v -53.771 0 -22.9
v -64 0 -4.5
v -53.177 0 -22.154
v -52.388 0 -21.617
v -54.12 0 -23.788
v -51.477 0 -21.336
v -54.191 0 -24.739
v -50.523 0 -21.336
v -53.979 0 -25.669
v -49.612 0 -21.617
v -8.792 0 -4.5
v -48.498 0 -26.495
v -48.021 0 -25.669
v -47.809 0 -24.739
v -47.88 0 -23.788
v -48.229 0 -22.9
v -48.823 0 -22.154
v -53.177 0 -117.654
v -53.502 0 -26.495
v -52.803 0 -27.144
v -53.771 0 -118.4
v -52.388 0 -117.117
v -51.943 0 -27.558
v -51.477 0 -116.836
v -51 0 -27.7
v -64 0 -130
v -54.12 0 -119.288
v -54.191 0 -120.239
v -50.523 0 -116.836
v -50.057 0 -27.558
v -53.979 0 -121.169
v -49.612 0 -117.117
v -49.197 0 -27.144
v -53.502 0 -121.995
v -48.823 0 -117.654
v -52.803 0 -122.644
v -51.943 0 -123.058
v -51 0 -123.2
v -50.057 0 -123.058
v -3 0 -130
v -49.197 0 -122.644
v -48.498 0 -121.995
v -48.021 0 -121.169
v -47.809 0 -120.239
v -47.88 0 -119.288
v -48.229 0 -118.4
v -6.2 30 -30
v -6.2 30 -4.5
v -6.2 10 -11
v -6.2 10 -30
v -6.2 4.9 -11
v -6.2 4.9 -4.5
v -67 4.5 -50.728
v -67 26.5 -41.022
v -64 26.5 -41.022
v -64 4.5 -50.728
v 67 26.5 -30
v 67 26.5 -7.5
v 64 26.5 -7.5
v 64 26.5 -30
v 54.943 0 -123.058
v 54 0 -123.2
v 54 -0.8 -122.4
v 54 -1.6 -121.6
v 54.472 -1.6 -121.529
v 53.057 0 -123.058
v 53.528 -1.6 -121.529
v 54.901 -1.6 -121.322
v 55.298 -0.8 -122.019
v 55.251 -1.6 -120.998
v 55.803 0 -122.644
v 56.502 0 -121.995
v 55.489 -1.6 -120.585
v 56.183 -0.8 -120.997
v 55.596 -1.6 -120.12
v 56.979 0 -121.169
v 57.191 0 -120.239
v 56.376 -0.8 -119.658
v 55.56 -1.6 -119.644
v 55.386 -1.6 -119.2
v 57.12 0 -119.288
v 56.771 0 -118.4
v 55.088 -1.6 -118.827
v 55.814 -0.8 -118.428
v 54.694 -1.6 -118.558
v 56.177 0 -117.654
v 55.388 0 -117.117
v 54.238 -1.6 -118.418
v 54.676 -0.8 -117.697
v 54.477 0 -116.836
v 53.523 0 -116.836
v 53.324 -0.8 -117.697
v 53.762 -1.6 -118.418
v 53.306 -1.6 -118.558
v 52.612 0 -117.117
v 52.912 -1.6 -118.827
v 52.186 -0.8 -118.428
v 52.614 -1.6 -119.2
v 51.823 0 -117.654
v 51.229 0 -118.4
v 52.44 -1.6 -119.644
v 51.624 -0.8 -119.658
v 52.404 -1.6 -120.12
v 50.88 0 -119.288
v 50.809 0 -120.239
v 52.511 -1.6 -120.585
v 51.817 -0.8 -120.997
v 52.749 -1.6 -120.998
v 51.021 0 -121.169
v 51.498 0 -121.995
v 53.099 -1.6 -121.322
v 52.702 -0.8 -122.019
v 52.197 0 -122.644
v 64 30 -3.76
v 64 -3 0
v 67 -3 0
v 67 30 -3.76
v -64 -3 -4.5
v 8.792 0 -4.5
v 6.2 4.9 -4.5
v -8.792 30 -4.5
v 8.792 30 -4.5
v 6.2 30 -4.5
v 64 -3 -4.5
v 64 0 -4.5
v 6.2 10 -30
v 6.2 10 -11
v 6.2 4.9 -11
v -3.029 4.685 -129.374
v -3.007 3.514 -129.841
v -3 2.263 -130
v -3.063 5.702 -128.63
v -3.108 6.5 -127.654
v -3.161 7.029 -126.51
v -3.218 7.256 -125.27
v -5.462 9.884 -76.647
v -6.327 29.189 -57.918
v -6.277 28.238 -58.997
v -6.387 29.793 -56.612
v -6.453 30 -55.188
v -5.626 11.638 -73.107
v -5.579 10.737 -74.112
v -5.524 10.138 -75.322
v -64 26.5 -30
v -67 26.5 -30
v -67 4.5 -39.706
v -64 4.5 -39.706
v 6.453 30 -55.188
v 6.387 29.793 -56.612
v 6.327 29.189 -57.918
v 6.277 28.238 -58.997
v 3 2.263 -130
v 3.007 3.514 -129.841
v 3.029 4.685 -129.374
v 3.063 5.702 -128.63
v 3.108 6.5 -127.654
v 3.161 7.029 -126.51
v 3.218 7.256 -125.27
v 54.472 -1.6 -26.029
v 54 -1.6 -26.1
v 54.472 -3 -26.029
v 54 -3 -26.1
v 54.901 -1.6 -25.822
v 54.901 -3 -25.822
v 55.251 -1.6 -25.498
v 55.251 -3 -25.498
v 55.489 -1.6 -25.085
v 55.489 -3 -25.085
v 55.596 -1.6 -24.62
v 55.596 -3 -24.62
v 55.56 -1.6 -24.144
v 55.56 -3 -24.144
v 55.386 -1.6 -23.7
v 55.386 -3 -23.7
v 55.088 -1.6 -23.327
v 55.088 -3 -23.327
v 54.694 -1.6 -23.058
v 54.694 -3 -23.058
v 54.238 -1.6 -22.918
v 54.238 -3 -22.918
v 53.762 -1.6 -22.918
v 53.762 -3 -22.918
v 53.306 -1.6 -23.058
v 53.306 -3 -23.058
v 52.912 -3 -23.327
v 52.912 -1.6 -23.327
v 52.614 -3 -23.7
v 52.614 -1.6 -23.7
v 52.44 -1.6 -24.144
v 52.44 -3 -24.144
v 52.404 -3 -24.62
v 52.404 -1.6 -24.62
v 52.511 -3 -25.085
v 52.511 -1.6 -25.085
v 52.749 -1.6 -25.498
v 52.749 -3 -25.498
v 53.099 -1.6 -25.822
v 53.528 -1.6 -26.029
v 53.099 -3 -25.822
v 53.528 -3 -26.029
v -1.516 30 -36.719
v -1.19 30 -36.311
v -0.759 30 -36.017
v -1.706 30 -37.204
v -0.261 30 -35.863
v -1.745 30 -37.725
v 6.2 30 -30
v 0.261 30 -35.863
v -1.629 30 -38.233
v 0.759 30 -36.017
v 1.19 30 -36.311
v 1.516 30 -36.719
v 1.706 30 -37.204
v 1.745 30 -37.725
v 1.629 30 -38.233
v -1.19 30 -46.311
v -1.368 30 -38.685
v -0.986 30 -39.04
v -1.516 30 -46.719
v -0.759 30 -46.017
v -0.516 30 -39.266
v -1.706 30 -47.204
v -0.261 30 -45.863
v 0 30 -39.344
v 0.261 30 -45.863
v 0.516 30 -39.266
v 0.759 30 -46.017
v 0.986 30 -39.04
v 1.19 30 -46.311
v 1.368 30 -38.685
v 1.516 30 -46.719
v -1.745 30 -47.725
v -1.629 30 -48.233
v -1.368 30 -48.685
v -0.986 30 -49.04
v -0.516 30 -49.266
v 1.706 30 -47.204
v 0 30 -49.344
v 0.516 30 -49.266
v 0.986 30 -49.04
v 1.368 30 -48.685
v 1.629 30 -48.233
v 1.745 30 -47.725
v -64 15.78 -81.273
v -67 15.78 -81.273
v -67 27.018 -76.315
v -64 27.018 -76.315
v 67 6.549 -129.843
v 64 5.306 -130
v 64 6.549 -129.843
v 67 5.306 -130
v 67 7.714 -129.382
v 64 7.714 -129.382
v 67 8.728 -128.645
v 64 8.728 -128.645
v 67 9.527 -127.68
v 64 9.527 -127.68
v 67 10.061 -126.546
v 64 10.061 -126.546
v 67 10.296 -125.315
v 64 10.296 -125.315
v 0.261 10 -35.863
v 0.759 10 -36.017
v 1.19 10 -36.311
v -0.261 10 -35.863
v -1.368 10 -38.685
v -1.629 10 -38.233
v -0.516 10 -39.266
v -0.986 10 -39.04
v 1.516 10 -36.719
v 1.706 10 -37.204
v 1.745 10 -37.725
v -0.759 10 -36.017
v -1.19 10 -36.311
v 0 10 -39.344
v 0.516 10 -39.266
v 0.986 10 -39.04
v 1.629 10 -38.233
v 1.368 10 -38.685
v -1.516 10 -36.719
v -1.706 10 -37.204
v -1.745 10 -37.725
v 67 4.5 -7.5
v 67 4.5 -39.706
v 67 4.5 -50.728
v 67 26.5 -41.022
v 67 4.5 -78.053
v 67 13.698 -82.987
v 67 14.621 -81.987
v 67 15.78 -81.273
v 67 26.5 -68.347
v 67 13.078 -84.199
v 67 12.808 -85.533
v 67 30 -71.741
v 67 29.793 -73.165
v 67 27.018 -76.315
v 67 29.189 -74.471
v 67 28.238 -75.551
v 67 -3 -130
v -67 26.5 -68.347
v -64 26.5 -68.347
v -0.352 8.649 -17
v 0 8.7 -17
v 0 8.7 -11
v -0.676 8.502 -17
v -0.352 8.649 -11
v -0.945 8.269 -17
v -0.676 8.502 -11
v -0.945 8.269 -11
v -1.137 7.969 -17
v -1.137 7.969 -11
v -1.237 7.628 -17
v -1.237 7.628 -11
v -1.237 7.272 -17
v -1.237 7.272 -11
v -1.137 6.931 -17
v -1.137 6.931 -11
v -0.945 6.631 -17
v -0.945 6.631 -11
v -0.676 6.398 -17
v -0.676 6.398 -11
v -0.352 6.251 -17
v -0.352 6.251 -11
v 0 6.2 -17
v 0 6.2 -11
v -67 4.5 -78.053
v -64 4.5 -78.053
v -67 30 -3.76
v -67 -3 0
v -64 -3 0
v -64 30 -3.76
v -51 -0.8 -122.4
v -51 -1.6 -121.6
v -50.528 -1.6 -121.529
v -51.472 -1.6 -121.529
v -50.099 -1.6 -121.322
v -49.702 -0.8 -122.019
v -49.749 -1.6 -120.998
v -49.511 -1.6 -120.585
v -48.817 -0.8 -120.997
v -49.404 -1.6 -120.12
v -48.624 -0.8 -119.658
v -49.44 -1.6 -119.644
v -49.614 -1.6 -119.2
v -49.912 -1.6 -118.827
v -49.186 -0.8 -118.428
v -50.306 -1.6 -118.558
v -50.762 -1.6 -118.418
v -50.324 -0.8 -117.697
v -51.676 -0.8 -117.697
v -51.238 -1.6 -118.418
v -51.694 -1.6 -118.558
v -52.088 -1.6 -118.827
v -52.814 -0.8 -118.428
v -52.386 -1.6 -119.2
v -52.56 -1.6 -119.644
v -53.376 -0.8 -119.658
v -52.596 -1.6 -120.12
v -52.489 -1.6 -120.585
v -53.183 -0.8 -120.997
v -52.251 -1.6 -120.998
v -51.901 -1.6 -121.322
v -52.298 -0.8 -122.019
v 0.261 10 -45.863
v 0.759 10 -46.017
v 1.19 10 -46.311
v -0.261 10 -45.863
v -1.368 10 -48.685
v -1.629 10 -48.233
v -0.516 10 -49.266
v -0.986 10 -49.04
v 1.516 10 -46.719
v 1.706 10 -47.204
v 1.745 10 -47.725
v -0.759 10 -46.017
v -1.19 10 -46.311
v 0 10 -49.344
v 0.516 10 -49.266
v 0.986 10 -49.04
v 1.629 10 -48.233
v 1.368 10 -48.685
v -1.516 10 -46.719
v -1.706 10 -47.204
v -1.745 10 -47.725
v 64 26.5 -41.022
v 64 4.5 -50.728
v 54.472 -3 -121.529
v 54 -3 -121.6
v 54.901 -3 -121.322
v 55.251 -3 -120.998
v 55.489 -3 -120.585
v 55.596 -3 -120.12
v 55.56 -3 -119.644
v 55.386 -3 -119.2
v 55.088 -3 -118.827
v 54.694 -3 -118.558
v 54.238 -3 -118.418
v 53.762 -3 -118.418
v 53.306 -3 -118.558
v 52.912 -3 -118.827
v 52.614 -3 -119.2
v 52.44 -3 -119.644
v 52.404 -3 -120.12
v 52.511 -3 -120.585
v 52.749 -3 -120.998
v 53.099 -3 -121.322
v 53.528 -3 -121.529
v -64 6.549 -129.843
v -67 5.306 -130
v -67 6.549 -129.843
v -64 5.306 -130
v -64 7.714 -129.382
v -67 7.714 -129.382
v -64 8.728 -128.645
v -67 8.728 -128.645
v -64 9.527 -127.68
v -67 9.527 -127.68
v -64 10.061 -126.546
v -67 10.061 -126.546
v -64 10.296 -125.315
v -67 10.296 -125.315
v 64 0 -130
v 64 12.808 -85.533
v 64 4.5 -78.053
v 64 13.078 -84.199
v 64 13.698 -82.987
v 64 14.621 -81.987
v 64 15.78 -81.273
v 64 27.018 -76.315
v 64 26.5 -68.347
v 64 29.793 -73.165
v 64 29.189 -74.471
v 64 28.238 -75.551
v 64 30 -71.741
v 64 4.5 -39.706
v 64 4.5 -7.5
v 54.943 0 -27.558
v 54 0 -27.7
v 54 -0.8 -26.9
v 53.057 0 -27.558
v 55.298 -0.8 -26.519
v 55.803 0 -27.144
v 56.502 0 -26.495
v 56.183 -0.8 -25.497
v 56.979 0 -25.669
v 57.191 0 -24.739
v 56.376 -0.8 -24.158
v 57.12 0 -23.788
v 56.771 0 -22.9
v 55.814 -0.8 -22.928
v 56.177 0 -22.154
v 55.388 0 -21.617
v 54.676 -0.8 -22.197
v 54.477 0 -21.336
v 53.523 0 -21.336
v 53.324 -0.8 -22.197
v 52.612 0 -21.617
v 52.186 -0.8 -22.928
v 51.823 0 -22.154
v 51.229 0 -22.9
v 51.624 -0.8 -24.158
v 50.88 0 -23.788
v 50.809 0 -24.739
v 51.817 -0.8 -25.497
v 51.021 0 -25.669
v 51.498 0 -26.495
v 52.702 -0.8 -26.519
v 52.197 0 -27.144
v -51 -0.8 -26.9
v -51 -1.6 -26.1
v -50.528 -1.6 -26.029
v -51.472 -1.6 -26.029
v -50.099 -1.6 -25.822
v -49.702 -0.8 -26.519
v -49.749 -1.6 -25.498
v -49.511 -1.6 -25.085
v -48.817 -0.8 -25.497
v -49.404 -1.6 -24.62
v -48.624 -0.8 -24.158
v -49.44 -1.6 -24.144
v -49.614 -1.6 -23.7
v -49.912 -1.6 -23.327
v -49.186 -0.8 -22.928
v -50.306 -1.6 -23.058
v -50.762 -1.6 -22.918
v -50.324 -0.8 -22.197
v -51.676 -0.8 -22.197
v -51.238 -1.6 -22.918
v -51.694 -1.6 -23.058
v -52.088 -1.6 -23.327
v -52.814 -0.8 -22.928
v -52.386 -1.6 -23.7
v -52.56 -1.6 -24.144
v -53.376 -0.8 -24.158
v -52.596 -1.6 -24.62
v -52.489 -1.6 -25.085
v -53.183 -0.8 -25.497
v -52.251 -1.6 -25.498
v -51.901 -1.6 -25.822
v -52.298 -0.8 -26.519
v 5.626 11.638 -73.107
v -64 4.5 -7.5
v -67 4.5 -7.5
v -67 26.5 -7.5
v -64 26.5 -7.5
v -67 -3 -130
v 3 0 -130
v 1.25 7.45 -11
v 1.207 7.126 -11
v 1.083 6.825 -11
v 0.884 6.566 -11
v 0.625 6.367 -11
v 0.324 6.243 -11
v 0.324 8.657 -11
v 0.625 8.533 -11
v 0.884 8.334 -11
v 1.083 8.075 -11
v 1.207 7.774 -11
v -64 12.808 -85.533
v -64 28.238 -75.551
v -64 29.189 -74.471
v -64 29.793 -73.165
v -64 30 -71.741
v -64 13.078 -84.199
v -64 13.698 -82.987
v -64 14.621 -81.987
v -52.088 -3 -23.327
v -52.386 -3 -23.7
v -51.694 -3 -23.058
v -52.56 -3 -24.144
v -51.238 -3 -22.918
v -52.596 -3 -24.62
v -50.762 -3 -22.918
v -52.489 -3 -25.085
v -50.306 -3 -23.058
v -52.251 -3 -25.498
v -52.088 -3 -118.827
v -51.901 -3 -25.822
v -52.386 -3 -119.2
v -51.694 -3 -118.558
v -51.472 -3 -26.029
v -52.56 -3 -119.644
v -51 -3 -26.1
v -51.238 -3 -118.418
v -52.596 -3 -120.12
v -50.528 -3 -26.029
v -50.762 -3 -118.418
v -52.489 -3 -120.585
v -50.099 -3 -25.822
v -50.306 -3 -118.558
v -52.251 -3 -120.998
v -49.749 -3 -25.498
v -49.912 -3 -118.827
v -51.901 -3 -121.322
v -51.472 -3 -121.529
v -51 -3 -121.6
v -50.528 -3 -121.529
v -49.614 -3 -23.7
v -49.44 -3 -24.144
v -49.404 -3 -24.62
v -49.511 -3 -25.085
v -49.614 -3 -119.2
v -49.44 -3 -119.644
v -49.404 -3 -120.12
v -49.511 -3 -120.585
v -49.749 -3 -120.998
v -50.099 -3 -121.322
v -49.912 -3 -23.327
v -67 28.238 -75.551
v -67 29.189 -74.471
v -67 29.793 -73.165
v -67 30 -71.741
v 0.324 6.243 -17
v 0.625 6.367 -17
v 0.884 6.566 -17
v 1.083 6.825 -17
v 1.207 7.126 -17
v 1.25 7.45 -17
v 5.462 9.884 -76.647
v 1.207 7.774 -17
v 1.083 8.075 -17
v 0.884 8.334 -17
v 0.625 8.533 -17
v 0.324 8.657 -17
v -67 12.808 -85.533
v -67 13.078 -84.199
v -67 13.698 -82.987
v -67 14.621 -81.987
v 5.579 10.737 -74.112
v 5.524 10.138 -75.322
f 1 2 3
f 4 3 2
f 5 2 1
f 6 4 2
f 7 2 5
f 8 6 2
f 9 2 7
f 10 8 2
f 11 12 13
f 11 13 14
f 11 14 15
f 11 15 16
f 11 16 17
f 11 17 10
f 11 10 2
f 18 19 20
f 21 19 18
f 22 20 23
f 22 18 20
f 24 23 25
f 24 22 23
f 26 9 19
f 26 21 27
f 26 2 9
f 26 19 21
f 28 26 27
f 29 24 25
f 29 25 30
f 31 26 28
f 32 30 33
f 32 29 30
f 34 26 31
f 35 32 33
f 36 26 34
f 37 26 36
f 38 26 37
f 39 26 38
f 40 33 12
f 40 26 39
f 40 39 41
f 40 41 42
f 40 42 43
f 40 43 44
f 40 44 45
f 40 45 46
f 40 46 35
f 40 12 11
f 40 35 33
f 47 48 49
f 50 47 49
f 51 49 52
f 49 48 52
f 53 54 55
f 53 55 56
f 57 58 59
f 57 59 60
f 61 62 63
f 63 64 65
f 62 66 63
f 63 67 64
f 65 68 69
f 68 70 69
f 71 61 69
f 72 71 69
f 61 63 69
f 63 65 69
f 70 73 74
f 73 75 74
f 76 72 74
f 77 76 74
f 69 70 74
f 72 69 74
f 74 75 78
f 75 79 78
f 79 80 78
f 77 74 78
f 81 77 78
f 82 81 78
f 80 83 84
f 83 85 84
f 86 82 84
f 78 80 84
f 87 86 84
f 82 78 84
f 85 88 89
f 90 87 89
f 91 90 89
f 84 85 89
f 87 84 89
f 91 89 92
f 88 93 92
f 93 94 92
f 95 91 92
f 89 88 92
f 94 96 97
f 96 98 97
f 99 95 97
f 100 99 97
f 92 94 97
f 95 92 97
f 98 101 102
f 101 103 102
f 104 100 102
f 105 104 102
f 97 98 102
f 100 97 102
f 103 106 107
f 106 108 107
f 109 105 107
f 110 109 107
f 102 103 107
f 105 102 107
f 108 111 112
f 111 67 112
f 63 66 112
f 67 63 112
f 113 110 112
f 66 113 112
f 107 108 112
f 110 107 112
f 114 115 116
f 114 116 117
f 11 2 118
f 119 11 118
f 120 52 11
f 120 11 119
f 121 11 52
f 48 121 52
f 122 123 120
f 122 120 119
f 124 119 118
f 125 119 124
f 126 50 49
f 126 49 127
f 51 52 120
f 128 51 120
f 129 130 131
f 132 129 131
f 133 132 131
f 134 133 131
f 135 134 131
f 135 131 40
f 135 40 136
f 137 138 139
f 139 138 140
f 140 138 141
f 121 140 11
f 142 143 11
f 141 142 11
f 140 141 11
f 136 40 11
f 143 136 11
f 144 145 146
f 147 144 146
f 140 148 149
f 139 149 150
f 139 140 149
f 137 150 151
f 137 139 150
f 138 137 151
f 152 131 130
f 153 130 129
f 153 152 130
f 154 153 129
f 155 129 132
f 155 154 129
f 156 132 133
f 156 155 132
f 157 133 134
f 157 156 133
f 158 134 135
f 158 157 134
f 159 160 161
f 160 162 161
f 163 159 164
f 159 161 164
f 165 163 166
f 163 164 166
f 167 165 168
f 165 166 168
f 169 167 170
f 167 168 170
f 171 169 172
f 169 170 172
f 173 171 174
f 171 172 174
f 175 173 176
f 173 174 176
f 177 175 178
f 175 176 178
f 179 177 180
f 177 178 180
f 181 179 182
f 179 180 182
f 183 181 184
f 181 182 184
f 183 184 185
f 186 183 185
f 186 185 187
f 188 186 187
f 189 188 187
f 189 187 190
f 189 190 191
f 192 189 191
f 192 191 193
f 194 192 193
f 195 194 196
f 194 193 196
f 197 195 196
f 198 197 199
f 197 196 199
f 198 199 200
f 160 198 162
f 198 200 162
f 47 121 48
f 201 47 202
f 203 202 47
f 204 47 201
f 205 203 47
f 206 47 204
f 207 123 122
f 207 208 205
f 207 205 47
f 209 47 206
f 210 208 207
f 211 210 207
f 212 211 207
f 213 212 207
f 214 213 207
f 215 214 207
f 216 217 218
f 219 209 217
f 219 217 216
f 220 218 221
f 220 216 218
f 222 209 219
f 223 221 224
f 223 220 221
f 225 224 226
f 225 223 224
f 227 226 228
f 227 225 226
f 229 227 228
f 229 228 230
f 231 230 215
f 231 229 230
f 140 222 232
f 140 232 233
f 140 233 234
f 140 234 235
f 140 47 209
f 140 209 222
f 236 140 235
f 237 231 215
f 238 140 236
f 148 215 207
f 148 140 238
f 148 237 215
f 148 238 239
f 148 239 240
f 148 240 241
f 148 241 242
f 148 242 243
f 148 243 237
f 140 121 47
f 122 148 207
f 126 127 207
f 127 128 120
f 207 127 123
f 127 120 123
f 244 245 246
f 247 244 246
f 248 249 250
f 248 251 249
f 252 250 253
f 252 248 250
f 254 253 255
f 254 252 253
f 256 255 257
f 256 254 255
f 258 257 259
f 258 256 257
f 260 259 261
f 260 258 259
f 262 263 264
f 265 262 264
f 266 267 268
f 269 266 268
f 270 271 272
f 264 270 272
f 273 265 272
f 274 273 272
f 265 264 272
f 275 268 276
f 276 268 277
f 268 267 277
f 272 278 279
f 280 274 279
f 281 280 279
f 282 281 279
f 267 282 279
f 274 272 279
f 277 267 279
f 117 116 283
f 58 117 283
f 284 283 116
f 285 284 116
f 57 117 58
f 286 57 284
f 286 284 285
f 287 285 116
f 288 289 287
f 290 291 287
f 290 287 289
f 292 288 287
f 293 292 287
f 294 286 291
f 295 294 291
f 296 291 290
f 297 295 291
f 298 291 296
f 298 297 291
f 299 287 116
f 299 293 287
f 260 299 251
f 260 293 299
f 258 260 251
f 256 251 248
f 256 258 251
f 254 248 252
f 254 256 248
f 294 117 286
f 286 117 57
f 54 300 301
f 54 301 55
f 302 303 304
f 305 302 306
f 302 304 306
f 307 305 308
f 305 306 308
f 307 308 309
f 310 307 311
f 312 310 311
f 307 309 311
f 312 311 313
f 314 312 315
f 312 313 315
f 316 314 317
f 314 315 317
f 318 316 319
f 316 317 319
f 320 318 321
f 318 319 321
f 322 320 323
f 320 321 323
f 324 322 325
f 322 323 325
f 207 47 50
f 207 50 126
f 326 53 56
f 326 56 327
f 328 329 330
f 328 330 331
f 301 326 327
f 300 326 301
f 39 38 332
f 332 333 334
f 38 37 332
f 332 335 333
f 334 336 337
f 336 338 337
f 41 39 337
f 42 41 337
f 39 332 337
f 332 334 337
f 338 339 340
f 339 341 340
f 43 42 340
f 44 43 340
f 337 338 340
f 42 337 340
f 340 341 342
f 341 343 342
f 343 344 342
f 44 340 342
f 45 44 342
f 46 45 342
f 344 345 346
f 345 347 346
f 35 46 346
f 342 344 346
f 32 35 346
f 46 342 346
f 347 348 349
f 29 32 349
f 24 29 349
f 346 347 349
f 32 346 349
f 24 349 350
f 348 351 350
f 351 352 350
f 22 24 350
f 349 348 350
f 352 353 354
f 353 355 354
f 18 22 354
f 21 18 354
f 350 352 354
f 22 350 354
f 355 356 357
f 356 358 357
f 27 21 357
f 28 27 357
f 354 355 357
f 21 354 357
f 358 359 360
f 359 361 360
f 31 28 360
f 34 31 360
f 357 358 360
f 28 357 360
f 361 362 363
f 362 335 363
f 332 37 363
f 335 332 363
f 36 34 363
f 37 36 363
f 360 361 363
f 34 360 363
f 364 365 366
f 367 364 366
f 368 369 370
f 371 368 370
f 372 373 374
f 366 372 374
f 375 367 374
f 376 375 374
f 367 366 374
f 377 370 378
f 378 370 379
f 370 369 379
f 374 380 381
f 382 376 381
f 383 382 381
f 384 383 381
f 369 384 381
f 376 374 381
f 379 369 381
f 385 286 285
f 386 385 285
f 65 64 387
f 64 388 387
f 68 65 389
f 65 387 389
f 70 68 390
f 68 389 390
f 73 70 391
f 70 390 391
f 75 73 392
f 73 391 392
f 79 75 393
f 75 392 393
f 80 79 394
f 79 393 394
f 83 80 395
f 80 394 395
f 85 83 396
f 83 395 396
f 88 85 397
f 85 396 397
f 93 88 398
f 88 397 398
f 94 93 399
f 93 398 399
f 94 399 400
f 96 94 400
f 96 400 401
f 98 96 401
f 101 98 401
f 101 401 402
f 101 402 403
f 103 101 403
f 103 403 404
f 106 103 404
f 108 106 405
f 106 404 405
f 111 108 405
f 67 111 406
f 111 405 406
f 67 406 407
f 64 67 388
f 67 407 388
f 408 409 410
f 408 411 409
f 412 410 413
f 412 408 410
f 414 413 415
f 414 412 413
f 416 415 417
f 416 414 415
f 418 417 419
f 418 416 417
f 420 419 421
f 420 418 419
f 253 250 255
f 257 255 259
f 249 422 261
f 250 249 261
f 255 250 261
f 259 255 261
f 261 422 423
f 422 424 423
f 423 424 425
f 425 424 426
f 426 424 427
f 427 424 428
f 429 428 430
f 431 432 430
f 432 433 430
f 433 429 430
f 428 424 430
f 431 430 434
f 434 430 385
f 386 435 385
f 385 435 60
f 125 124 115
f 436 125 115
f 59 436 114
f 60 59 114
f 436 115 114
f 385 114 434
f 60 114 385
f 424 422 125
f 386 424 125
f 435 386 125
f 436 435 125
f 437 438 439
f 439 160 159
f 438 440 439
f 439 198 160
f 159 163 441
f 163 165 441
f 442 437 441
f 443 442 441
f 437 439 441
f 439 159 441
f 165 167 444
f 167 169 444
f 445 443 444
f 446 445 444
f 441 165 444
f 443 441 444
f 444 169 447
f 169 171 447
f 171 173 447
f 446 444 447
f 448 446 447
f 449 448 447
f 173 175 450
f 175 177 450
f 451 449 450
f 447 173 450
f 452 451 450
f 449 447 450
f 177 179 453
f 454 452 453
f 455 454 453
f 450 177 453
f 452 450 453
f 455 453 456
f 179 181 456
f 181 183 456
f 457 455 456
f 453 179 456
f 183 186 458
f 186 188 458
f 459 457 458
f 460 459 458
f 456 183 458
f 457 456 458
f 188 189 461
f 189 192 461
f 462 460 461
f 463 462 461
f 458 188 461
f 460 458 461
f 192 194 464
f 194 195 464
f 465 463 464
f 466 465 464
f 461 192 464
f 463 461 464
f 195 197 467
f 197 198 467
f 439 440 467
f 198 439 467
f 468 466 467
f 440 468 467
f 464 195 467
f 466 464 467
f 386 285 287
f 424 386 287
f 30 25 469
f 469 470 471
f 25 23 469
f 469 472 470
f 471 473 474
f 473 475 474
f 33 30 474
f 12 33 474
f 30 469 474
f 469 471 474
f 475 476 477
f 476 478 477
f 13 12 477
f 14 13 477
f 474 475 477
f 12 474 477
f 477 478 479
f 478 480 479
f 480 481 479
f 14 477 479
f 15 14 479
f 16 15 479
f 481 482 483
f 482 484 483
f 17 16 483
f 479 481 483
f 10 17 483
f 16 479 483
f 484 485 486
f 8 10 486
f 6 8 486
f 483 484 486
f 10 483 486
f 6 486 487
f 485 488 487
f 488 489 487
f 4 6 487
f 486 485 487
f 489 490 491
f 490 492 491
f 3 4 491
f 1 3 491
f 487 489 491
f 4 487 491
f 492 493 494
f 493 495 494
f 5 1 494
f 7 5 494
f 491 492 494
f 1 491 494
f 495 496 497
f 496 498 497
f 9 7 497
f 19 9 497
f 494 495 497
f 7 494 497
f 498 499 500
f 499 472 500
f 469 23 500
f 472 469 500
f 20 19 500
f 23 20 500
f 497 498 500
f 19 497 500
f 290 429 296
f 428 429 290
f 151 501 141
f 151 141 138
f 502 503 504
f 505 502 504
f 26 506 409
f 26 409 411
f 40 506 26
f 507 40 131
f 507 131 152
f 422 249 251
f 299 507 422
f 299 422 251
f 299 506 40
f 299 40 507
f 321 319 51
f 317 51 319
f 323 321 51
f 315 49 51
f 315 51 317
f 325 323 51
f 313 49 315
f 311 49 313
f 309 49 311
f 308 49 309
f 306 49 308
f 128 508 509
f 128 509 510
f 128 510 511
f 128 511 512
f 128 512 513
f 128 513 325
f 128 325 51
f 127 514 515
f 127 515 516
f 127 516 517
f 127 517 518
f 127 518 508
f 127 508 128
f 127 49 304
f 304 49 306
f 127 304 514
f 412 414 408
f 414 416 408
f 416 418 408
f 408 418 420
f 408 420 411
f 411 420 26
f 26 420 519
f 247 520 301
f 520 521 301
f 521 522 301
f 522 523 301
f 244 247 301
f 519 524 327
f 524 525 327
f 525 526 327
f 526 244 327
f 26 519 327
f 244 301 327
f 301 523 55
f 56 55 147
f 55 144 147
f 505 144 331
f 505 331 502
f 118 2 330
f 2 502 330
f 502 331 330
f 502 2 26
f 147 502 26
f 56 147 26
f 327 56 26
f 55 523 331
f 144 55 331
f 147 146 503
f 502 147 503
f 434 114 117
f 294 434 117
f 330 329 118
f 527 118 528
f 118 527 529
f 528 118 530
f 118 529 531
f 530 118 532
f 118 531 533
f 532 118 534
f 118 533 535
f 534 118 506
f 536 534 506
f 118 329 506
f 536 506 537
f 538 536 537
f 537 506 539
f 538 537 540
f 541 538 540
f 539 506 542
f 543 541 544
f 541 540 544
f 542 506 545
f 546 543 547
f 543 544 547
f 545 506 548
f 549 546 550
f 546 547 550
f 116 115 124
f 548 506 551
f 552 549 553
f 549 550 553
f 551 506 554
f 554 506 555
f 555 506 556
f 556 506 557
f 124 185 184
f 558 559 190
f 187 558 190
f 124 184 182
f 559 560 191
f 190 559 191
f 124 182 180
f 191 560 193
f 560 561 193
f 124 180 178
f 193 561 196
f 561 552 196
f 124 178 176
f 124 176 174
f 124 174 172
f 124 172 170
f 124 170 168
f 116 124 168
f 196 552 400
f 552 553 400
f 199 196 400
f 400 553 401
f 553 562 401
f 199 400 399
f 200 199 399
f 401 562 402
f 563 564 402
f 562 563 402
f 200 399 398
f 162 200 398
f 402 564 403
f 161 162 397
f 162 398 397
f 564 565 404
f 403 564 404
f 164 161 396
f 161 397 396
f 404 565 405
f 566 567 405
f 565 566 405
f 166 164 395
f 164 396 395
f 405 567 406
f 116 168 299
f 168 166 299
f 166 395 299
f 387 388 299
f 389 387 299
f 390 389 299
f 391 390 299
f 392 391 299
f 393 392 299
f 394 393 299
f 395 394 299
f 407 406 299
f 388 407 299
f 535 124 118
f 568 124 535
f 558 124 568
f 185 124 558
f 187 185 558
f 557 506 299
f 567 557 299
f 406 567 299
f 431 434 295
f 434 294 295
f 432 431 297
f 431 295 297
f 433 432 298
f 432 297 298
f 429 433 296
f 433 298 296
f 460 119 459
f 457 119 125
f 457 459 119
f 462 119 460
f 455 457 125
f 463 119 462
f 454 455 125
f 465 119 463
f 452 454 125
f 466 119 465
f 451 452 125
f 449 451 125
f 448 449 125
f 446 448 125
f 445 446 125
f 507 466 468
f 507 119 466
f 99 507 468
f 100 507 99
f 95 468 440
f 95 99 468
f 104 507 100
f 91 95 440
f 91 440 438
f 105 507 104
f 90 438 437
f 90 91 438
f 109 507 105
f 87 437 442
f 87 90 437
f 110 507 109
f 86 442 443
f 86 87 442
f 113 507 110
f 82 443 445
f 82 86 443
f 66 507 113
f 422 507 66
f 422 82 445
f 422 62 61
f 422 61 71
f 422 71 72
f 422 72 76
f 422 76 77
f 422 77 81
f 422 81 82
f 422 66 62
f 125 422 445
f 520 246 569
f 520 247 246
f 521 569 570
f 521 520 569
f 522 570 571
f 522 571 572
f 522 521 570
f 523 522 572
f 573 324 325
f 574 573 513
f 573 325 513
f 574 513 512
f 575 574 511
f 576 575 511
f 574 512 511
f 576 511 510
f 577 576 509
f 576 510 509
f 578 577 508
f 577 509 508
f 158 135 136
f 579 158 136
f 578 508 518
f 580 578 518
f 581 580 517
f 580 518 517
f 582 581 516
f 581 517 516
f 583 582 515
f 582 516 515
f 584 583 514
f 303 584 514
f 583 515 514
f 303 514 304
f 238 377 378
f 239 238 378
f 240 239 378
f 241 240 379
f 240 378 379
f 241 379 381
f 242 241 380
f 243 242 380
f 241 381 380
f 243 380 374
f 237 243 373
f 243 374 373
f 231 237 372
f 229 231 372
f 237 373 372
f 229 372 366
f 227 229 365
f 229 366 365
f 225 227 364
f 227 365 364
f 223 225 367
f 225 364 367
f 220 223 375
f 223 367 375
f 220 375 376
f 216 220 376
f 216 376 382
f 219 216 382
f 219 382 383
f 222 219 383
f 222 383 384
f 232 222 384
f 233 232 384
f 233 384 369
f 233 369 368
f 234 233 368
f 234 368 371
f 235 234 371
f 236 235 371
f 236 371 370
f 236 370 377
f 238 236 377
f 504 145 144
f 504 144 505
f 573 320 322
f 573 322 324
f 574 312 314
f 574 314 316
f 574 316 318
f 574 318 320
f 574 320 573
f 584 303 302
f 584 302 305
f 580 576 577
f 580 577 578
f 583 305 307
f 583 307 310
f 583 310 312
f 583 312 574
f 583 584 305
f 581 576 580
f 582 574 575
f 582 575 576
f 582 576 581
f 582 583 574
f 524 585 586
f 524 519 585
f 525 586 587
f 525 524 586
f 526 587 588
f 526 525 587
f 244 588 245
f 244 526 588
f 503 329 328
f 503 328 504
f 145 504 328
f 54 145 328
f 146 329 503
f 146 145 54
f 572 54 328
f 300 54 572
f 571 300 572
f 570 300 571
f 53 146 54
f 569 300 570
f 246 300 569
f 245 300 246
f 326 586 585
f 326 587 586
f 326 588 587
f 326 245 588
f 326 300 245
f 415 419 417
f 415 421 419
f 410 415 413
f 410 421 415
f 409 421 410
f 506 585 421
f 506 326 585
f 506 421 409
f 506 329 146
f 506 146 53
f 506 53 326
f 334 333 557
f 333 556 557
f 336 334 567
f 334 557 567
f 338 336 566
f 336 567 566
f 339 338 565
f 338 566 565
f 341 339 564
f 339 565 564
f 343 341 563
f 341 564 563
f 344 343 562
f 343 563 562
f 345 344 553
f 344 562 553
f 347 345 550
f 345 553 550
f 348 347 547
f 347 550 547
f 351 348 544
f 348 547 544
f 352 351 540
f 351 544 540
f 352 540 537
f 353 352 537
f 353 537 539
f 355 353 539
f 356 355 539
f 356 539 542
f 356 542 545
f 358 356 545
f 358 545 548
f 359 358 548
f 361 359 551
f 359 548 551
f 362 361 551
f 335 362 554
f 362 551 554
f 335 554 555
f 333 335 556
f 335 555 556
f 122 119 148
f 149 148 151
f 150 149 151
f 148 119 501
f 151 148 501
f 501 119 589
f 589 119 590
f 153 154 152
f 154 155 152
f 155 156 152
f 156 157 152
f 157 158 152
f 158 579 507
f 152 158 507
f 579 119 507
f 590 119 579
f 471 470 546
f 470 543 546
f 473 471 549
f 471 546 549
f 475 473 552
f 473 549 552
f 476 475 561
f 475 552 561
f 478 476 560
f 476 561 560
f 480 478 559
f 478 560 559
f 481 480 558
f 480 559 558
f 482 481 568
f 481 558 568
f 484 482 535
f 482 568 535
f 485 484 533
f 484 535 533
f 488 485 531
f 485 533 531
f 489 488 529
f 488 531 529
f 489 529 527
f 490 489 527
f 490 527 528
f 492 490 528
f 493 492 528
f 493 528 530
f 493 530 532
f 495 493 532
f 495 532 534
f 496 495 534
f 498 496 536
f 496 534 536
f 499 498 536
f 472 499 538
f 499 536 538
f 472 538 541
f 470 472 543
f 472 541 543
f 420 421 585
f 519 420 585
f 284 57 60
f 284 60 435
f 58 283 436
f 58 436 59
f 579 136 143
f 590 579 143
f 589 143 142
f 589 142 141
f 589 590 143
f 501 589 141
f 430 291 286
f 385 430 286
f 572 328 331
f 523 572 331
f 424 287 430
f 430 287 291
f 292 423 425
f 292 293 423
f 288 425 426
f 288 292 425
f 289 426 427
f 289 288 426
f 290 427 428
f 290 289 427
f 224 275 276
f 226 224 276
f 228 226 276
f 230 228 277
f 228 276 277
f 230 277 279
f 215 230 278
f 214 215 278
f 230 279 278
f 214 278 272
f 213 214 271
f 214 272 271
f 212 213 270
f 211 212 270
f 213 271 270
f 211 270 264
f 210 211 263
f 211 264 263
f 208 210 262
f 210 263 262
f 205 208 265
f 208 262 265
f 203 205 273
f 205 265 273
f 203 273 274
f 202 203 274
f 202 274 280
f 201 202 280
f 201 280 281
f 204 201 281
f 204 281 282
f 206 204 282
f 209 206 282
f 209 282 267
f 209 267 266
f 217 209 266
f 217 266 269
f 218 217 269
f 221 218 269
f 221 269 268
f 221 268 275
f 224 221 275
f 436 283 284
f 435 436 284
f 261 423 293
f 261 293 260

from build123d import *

# Parameters (mm, degrees)
SKETCH2_W                      = 3
SKETCH2_H                      = 130
BOSS_EXTRUDE1_DEPTH            = 3
SKETCH2_3_W                    = 3
SKETCH2_3_H                    = 130
BOSS_EXTRUDE2_DEPTH            = 30
CUT_EXTRUDE2_DEPTH             = 3
CUT_EXTRUDE3_DEPTH             = 190.092569923
CUT_EXTRUDE3_DEPTH_BACK        = 3
CUT_EXTRUDE4_REACH             = 151.812
CUT_EXTRUDE4_DIRECTION_2_REACH = 151.812
SKETCH9_W                      = 12.4
SKETCH9_H                      = 20
CUT_EXTRUDE5_DEPTH             = 30
CUT_EXTRUDE6_DEPTH             = 11
CUT_EXTRUDE7_DEPTH             = 4.5
CUT_EXTRUDE8_DEPTH             = 17
SKETCH3_W                      = 22.5
SKETCH3_H                      = 22
CUT_EXTRUDE1_DEPTH             = 3
SKETCH10_W                     = 22.5
SKETCH10_H                     = 22
CUT_EXTRUDE9_DEPTH             = 3
CUT_EXTRUDE10_DEPTH            = 190.092569923
FILLET1_R                      = 5
HOLE1_D                        = 3.5
HOLE1_DEPTH                    = 20
HOLE2_D                        = 3.2
HOLE2_DEPTH                    = 4.737087713
HOLE2_CSINK_D                  = 6.4
HOLE2_CSINK_ANGLE              = 90


with BuildPart() as part:
    # Sketch2 → Boss-Extrude1 (new body)
    with BuildSketch(Plane(origin=(0, 0, 0), x_dir=(1, 0, 0), z_dir=(0, 1, 0))):
        Polygon((-3, 130), (-64, 130), (-64, 0), (-9, 0), align=None)
        with Locations((-65.5, 65)):
            Rectangle(SKETCH2_W, SKETCH2_H)
        Polygon((0, 130), (-3, 130), (-9, 0), (0, 0), align=None)
        Polygon((3, 130), (0, 130), (0, 0), (9, 0), align=None)
        Polygon((64, 130), (3, 130), (9, 0), (64, 0), align=None)
        with Locations((65.5, 65)):
            Rectangle(SKETCH2_W, SKETCH2_H)
    extrude(amount=-BOSS_EXTRUDE1_DEPTH)

    # Sketch2<3> → Boss-Extrude2 (add)
    with BuildSketch(Plane(origin=(0, 0, 0), x_dir=(1, 0, 0), z_dir=(0, 1, 0))):
        Polygon((0, 130), (-3, 130), (-9, 0), (0, 0), align=None)
        Polygon((3, 130), (0, 130), (0, 0), (9, 0), align=None)
        with Locations((-65.5, 65)):
            Rectangle(SKETCH2_3_W, SKETCH2_3_H)
        with Locations((65.5, 65)):
            Rectangle(SKETCH2_3_W, SKETCH2_3_H)
    extrude(amount=BOSS_EXTRUDE2_DEPTH)

    # Sketch5 → Cut-Extrude2 (cut)
    with BuildSketch(Plane.ZY.offset(67)):
        Polygon((-130, 30), (-130, 10), (-82.5, 13), (-75, 30), align=None)
    extrude(amount=-CUT_EXTRUDE2_DEPTH, mode=Mode.SUBTRACT)

    # Sketch6 → Cut-Extrude3 (cut, two sides: drawn at the far end of the back side and taken through both)
    with BuildSketch(Plane(origin=(67, 0, 0), x_dir=(0, 0, -1), z_dir=(1, 0, 0)).offset(-CUT_EXTRUDE3_DEPTH_BACK)):
        Polygon((75, 30), (82.5, 13), (130, 10), (130, 30), align=None)
    extrude(amount=CUT_EXTRUDE3_DEPTH + CUT_EXTRUDE3_DEPTH_BACK, mode=Mode.SUBTRACT)

    # Cut-Extrude4: up to this plane
    cut_extrude4_end = Plane(origin=(-8.980869154, 30, -0.414501653), z_dir=(0.9989366098486855, 0, 0.04610476660840086))
    # Sketch7 → Cut-Extrude4 (cut, up to the surface)
    with BuildSketch(Plane(origin=(1.5, 0, -0.187149168), x_dir=(0, 0, -1), z_dir=(1, 0, 0)), mode=Mode.PRIVATE) as cut_extrude4_sk1:
        Polygon((129.812850832, 7), (74.312850832, 10), (57.312850832, 30), (129.812850832, 30), align=None)
    cut_extrude4_tool1 = split(extrude(cut_extrude4_sk1.sketch, amount=-CUT_EXTRUDE4_REACH, mode=Mode.PRIVATE), bisect_by=cut_extrude4_end, keep=Keep.BOTH, mode=Mode.PRIVATE)
    add(cut_extrude4_tool1.solids().sort_by_distance((1.5, 19.743933, -98.647747))[0], mode=Mode.SUBTRACT)

    # Cut-Extrude4 direction 2: up to this plane
    cut_extrude4_direction_2_end = Plane(origin=(8.980869154, 30, -0.414501653), z_dir=(0.9989366098486855, 0, -0.04610476660840086))
    # Sketch7 → Cut-Extrude4 direction 2 (cut, up to the surface)
    with BuildSketch(Plane(origin=(1.5, 0, -0.187149168), x_dir=(0, 0, -1), z_dir=(1, 0, 0)), mode=Mode.PRIVATE) as cut_extrude4_direction_2_sk1:
        Polygon((129.812850832, 7), (74.312850832, 10), (57.312850832, 30), (129.812850832, 30), align=None)
    cut_extrude4_direction_2_tool1 = split(extrude(cut_extrude4_direction_2_sk1.sketch, amount=CUT_EXTRUDE4_DIRECTION_2_REACH, mode=Mode.PRIVATE), bisect_by=cut_extrude4_direction_2_end, keep=Keep.BOTH, mode=Mode.PRIVATE)
    add(cut_extrude4_direction_2_tool1.solids().sort_by_distance((1.5, 19.743933, -98.647747))[0], mode=Mode.SUBTRACT)

    # Sketch9 → Cut-Extrude5 (cut)
    with BuildSketch(Plane.XY):
        with Locations((0, 20)):
            Rectangle(SKETCH9_W, SKETCH9_H)
    extrude(amount=-CUT_EXTRUDE5_DEPTH, mode=Mode.SUBTRACT)

    # Sketch9<3> → Cut-Extrude6 (cut)
    with BuildSketch(Plane.XY):
        with BuildLine():
            Line((0, 10), (-6.2, 10))
            Line((-6.2, 10), (-6.2, 4.9))
            Line((-6.2, 4.9), (0, 4.9))
            Line((0, 4.9), (0, 6.2))
            ThreePointArc((0, 6.2), (-1.25, 7.45), (0, 8.7))
            Line((0, 8.7), (0, 10))
        make_face()
        with BuildLine():
            Line((6.2, 4.9), (6.2, 10))
            Line((6.2, 10), (0, 10))
            Line((0, 10), (0, 8.7))
            ThreePointArc((0, 8.7), (0.883883476, 8.333883476), (1.25, 7.45))
            ThreePointArc((1.25, 7.45), (0.883883476, 6.566116524), (0, 6.2))
            Line((0, 6.2), (0, 4.9))
            Line((0, 4.9), (6.2, 4.9))
        make_face()
    extrude(amount=-CUT_EXTRUDE6_DEPTH, mode=Mode.SUBTRACT)

    # Sketch9<4> → Cut-Extrude7 (cut)
    with BuildSketch(Plane.XY):
        Polygon((-6.2, 10), (-6.2, 30), (-9, 30), (-9, 0), (9, 0), (9, 30), (6.2, 30), (6.2, 10), (6.2, 4.9), (-6.2, 4.9), align=None)
        Polygon((9, 0), (-9, 0), (-64, 0), (-64, -3), (64, -3), (64, 0), align=None)
    extrude(amount=-CUT_EXTRUDE7_DEPTH, mode=Mode.SUBTRACT)

    # Sketch9<5> → Cut-Extrude8 (cut)
    with BuildSketch(Plane.XY):
        with BuildLine():
            ThreePointArc((1.25, 7.45), (0.883883476, 8.333883476), (0, 8.7))
            Line((0, 8.7), (0, 6.2))
            ThreePointArc((0, 6.2), (0.883883476, 6.566116524), (1.25, 7.45))
        make_face()
        with BuildLine():
            Line((0, 6.2), (0, 8.7))
            ThreePointArc((0, 8.7), (-1.25, 7.45), (0, 6.2))
        make_face()
    extrude(amount=-CUT_EXTRUDE8_DEPTH, mode=Mode.SUBTRACT)

    # Sketch3 → Cut-Extrude1 (cut)
    with BuildSketch(Plane.ZY.offset(67)):
        Polygon((-50.727683193, 4.5), (-78.052542275, 4.5), (-68.346659922, 26.5), (-41.02180084, 26.5), align=None)
        with Locations((-18.75, 15.5)):
            Rectangle(SKETCH3_W, SKETCH3_H)
        Polygon((-30, 4.5), (-30, 26.5), (-39.705882353, 4.5), align=None)
    extrude(amount=-CUT_EXTRUDE1_DEPTH, mode=Mode.SUBTRACT)

    # Sketch10 → Cut-Extrude9 (cut)
    with BuildSketch(Plane(origin=(67, 0, 0), x_dir=(0, 0, -1), z_dir=(1, 0, 0))):
        with Locations((18.75, 15.5)):
            Rectangle(SKETCH10_W, SKETCH10_H)
        Polygon((30, 4.5), (30, 26.5), (39.705882353, 4.5), align=None)
        Polygon((50.727683193, 4.5), (78.052542275, 4.5), (68.346659922, 26.5), (41.02180084, 26.5), align=None)
    extrude(amount=-CUT_EXTRUDE9_DEPTH, mode=Mode.SUBTRACT)

    # Sketch11 → Cut-Extrude10 (cut, through all)
    with BuildSketch(Plane.ZY.offset(67)):
        Polygon((0, -3), (-3.759875074, 30), (0, 30), align=None)
    extrude(amount=-CUT_EXTRUDE10_DEPTH, mode=Mode.SUBTRACT)

    # Fillet1
    fillet1_edges = [part.edges().sort_by_distance(p)[0] for p in [
        (-65.5, 30, -75),
        (-65.5, 10, -130),
        (-65.5, 13, -82.5),
        (65.5, 30, -75),
        (65.5, 13, -82.5),
        (65.5, 10, -130),
        (0, 10, -74.5),
        (0, 30, -57.5),
        (0, 7, -130),
    ]]
    fillet(fillet1_edges, radius=FILLET1_R)

    # Hole1
    with Locations(Plane(origin=(0, 30, -47.593898813), x_dir=(0, 0, 1), z_dir=(0, 1, 0))):
        with Locations((0, 0), (10, 0)):
            Hole(HOLE1_D / 2, depth=HOLE1_DEPTH)

    # Hole2
    with Locations(Plane(origin=(-51, 0, -120), x_dir=(0, 0, 1), z_dir=(0, 1, 0))):
        with Locations((0, 0), (0, 105), (95.5, 105), (95.5, 0)):
            CounterSinkHole(HOLE2_D / 2, HOLE2_CSINK_D / 2, depth=HOLE2_DEPTH, counter_sink_angle=HOLE2_CSINK_ANGLE)


solid = part.part
